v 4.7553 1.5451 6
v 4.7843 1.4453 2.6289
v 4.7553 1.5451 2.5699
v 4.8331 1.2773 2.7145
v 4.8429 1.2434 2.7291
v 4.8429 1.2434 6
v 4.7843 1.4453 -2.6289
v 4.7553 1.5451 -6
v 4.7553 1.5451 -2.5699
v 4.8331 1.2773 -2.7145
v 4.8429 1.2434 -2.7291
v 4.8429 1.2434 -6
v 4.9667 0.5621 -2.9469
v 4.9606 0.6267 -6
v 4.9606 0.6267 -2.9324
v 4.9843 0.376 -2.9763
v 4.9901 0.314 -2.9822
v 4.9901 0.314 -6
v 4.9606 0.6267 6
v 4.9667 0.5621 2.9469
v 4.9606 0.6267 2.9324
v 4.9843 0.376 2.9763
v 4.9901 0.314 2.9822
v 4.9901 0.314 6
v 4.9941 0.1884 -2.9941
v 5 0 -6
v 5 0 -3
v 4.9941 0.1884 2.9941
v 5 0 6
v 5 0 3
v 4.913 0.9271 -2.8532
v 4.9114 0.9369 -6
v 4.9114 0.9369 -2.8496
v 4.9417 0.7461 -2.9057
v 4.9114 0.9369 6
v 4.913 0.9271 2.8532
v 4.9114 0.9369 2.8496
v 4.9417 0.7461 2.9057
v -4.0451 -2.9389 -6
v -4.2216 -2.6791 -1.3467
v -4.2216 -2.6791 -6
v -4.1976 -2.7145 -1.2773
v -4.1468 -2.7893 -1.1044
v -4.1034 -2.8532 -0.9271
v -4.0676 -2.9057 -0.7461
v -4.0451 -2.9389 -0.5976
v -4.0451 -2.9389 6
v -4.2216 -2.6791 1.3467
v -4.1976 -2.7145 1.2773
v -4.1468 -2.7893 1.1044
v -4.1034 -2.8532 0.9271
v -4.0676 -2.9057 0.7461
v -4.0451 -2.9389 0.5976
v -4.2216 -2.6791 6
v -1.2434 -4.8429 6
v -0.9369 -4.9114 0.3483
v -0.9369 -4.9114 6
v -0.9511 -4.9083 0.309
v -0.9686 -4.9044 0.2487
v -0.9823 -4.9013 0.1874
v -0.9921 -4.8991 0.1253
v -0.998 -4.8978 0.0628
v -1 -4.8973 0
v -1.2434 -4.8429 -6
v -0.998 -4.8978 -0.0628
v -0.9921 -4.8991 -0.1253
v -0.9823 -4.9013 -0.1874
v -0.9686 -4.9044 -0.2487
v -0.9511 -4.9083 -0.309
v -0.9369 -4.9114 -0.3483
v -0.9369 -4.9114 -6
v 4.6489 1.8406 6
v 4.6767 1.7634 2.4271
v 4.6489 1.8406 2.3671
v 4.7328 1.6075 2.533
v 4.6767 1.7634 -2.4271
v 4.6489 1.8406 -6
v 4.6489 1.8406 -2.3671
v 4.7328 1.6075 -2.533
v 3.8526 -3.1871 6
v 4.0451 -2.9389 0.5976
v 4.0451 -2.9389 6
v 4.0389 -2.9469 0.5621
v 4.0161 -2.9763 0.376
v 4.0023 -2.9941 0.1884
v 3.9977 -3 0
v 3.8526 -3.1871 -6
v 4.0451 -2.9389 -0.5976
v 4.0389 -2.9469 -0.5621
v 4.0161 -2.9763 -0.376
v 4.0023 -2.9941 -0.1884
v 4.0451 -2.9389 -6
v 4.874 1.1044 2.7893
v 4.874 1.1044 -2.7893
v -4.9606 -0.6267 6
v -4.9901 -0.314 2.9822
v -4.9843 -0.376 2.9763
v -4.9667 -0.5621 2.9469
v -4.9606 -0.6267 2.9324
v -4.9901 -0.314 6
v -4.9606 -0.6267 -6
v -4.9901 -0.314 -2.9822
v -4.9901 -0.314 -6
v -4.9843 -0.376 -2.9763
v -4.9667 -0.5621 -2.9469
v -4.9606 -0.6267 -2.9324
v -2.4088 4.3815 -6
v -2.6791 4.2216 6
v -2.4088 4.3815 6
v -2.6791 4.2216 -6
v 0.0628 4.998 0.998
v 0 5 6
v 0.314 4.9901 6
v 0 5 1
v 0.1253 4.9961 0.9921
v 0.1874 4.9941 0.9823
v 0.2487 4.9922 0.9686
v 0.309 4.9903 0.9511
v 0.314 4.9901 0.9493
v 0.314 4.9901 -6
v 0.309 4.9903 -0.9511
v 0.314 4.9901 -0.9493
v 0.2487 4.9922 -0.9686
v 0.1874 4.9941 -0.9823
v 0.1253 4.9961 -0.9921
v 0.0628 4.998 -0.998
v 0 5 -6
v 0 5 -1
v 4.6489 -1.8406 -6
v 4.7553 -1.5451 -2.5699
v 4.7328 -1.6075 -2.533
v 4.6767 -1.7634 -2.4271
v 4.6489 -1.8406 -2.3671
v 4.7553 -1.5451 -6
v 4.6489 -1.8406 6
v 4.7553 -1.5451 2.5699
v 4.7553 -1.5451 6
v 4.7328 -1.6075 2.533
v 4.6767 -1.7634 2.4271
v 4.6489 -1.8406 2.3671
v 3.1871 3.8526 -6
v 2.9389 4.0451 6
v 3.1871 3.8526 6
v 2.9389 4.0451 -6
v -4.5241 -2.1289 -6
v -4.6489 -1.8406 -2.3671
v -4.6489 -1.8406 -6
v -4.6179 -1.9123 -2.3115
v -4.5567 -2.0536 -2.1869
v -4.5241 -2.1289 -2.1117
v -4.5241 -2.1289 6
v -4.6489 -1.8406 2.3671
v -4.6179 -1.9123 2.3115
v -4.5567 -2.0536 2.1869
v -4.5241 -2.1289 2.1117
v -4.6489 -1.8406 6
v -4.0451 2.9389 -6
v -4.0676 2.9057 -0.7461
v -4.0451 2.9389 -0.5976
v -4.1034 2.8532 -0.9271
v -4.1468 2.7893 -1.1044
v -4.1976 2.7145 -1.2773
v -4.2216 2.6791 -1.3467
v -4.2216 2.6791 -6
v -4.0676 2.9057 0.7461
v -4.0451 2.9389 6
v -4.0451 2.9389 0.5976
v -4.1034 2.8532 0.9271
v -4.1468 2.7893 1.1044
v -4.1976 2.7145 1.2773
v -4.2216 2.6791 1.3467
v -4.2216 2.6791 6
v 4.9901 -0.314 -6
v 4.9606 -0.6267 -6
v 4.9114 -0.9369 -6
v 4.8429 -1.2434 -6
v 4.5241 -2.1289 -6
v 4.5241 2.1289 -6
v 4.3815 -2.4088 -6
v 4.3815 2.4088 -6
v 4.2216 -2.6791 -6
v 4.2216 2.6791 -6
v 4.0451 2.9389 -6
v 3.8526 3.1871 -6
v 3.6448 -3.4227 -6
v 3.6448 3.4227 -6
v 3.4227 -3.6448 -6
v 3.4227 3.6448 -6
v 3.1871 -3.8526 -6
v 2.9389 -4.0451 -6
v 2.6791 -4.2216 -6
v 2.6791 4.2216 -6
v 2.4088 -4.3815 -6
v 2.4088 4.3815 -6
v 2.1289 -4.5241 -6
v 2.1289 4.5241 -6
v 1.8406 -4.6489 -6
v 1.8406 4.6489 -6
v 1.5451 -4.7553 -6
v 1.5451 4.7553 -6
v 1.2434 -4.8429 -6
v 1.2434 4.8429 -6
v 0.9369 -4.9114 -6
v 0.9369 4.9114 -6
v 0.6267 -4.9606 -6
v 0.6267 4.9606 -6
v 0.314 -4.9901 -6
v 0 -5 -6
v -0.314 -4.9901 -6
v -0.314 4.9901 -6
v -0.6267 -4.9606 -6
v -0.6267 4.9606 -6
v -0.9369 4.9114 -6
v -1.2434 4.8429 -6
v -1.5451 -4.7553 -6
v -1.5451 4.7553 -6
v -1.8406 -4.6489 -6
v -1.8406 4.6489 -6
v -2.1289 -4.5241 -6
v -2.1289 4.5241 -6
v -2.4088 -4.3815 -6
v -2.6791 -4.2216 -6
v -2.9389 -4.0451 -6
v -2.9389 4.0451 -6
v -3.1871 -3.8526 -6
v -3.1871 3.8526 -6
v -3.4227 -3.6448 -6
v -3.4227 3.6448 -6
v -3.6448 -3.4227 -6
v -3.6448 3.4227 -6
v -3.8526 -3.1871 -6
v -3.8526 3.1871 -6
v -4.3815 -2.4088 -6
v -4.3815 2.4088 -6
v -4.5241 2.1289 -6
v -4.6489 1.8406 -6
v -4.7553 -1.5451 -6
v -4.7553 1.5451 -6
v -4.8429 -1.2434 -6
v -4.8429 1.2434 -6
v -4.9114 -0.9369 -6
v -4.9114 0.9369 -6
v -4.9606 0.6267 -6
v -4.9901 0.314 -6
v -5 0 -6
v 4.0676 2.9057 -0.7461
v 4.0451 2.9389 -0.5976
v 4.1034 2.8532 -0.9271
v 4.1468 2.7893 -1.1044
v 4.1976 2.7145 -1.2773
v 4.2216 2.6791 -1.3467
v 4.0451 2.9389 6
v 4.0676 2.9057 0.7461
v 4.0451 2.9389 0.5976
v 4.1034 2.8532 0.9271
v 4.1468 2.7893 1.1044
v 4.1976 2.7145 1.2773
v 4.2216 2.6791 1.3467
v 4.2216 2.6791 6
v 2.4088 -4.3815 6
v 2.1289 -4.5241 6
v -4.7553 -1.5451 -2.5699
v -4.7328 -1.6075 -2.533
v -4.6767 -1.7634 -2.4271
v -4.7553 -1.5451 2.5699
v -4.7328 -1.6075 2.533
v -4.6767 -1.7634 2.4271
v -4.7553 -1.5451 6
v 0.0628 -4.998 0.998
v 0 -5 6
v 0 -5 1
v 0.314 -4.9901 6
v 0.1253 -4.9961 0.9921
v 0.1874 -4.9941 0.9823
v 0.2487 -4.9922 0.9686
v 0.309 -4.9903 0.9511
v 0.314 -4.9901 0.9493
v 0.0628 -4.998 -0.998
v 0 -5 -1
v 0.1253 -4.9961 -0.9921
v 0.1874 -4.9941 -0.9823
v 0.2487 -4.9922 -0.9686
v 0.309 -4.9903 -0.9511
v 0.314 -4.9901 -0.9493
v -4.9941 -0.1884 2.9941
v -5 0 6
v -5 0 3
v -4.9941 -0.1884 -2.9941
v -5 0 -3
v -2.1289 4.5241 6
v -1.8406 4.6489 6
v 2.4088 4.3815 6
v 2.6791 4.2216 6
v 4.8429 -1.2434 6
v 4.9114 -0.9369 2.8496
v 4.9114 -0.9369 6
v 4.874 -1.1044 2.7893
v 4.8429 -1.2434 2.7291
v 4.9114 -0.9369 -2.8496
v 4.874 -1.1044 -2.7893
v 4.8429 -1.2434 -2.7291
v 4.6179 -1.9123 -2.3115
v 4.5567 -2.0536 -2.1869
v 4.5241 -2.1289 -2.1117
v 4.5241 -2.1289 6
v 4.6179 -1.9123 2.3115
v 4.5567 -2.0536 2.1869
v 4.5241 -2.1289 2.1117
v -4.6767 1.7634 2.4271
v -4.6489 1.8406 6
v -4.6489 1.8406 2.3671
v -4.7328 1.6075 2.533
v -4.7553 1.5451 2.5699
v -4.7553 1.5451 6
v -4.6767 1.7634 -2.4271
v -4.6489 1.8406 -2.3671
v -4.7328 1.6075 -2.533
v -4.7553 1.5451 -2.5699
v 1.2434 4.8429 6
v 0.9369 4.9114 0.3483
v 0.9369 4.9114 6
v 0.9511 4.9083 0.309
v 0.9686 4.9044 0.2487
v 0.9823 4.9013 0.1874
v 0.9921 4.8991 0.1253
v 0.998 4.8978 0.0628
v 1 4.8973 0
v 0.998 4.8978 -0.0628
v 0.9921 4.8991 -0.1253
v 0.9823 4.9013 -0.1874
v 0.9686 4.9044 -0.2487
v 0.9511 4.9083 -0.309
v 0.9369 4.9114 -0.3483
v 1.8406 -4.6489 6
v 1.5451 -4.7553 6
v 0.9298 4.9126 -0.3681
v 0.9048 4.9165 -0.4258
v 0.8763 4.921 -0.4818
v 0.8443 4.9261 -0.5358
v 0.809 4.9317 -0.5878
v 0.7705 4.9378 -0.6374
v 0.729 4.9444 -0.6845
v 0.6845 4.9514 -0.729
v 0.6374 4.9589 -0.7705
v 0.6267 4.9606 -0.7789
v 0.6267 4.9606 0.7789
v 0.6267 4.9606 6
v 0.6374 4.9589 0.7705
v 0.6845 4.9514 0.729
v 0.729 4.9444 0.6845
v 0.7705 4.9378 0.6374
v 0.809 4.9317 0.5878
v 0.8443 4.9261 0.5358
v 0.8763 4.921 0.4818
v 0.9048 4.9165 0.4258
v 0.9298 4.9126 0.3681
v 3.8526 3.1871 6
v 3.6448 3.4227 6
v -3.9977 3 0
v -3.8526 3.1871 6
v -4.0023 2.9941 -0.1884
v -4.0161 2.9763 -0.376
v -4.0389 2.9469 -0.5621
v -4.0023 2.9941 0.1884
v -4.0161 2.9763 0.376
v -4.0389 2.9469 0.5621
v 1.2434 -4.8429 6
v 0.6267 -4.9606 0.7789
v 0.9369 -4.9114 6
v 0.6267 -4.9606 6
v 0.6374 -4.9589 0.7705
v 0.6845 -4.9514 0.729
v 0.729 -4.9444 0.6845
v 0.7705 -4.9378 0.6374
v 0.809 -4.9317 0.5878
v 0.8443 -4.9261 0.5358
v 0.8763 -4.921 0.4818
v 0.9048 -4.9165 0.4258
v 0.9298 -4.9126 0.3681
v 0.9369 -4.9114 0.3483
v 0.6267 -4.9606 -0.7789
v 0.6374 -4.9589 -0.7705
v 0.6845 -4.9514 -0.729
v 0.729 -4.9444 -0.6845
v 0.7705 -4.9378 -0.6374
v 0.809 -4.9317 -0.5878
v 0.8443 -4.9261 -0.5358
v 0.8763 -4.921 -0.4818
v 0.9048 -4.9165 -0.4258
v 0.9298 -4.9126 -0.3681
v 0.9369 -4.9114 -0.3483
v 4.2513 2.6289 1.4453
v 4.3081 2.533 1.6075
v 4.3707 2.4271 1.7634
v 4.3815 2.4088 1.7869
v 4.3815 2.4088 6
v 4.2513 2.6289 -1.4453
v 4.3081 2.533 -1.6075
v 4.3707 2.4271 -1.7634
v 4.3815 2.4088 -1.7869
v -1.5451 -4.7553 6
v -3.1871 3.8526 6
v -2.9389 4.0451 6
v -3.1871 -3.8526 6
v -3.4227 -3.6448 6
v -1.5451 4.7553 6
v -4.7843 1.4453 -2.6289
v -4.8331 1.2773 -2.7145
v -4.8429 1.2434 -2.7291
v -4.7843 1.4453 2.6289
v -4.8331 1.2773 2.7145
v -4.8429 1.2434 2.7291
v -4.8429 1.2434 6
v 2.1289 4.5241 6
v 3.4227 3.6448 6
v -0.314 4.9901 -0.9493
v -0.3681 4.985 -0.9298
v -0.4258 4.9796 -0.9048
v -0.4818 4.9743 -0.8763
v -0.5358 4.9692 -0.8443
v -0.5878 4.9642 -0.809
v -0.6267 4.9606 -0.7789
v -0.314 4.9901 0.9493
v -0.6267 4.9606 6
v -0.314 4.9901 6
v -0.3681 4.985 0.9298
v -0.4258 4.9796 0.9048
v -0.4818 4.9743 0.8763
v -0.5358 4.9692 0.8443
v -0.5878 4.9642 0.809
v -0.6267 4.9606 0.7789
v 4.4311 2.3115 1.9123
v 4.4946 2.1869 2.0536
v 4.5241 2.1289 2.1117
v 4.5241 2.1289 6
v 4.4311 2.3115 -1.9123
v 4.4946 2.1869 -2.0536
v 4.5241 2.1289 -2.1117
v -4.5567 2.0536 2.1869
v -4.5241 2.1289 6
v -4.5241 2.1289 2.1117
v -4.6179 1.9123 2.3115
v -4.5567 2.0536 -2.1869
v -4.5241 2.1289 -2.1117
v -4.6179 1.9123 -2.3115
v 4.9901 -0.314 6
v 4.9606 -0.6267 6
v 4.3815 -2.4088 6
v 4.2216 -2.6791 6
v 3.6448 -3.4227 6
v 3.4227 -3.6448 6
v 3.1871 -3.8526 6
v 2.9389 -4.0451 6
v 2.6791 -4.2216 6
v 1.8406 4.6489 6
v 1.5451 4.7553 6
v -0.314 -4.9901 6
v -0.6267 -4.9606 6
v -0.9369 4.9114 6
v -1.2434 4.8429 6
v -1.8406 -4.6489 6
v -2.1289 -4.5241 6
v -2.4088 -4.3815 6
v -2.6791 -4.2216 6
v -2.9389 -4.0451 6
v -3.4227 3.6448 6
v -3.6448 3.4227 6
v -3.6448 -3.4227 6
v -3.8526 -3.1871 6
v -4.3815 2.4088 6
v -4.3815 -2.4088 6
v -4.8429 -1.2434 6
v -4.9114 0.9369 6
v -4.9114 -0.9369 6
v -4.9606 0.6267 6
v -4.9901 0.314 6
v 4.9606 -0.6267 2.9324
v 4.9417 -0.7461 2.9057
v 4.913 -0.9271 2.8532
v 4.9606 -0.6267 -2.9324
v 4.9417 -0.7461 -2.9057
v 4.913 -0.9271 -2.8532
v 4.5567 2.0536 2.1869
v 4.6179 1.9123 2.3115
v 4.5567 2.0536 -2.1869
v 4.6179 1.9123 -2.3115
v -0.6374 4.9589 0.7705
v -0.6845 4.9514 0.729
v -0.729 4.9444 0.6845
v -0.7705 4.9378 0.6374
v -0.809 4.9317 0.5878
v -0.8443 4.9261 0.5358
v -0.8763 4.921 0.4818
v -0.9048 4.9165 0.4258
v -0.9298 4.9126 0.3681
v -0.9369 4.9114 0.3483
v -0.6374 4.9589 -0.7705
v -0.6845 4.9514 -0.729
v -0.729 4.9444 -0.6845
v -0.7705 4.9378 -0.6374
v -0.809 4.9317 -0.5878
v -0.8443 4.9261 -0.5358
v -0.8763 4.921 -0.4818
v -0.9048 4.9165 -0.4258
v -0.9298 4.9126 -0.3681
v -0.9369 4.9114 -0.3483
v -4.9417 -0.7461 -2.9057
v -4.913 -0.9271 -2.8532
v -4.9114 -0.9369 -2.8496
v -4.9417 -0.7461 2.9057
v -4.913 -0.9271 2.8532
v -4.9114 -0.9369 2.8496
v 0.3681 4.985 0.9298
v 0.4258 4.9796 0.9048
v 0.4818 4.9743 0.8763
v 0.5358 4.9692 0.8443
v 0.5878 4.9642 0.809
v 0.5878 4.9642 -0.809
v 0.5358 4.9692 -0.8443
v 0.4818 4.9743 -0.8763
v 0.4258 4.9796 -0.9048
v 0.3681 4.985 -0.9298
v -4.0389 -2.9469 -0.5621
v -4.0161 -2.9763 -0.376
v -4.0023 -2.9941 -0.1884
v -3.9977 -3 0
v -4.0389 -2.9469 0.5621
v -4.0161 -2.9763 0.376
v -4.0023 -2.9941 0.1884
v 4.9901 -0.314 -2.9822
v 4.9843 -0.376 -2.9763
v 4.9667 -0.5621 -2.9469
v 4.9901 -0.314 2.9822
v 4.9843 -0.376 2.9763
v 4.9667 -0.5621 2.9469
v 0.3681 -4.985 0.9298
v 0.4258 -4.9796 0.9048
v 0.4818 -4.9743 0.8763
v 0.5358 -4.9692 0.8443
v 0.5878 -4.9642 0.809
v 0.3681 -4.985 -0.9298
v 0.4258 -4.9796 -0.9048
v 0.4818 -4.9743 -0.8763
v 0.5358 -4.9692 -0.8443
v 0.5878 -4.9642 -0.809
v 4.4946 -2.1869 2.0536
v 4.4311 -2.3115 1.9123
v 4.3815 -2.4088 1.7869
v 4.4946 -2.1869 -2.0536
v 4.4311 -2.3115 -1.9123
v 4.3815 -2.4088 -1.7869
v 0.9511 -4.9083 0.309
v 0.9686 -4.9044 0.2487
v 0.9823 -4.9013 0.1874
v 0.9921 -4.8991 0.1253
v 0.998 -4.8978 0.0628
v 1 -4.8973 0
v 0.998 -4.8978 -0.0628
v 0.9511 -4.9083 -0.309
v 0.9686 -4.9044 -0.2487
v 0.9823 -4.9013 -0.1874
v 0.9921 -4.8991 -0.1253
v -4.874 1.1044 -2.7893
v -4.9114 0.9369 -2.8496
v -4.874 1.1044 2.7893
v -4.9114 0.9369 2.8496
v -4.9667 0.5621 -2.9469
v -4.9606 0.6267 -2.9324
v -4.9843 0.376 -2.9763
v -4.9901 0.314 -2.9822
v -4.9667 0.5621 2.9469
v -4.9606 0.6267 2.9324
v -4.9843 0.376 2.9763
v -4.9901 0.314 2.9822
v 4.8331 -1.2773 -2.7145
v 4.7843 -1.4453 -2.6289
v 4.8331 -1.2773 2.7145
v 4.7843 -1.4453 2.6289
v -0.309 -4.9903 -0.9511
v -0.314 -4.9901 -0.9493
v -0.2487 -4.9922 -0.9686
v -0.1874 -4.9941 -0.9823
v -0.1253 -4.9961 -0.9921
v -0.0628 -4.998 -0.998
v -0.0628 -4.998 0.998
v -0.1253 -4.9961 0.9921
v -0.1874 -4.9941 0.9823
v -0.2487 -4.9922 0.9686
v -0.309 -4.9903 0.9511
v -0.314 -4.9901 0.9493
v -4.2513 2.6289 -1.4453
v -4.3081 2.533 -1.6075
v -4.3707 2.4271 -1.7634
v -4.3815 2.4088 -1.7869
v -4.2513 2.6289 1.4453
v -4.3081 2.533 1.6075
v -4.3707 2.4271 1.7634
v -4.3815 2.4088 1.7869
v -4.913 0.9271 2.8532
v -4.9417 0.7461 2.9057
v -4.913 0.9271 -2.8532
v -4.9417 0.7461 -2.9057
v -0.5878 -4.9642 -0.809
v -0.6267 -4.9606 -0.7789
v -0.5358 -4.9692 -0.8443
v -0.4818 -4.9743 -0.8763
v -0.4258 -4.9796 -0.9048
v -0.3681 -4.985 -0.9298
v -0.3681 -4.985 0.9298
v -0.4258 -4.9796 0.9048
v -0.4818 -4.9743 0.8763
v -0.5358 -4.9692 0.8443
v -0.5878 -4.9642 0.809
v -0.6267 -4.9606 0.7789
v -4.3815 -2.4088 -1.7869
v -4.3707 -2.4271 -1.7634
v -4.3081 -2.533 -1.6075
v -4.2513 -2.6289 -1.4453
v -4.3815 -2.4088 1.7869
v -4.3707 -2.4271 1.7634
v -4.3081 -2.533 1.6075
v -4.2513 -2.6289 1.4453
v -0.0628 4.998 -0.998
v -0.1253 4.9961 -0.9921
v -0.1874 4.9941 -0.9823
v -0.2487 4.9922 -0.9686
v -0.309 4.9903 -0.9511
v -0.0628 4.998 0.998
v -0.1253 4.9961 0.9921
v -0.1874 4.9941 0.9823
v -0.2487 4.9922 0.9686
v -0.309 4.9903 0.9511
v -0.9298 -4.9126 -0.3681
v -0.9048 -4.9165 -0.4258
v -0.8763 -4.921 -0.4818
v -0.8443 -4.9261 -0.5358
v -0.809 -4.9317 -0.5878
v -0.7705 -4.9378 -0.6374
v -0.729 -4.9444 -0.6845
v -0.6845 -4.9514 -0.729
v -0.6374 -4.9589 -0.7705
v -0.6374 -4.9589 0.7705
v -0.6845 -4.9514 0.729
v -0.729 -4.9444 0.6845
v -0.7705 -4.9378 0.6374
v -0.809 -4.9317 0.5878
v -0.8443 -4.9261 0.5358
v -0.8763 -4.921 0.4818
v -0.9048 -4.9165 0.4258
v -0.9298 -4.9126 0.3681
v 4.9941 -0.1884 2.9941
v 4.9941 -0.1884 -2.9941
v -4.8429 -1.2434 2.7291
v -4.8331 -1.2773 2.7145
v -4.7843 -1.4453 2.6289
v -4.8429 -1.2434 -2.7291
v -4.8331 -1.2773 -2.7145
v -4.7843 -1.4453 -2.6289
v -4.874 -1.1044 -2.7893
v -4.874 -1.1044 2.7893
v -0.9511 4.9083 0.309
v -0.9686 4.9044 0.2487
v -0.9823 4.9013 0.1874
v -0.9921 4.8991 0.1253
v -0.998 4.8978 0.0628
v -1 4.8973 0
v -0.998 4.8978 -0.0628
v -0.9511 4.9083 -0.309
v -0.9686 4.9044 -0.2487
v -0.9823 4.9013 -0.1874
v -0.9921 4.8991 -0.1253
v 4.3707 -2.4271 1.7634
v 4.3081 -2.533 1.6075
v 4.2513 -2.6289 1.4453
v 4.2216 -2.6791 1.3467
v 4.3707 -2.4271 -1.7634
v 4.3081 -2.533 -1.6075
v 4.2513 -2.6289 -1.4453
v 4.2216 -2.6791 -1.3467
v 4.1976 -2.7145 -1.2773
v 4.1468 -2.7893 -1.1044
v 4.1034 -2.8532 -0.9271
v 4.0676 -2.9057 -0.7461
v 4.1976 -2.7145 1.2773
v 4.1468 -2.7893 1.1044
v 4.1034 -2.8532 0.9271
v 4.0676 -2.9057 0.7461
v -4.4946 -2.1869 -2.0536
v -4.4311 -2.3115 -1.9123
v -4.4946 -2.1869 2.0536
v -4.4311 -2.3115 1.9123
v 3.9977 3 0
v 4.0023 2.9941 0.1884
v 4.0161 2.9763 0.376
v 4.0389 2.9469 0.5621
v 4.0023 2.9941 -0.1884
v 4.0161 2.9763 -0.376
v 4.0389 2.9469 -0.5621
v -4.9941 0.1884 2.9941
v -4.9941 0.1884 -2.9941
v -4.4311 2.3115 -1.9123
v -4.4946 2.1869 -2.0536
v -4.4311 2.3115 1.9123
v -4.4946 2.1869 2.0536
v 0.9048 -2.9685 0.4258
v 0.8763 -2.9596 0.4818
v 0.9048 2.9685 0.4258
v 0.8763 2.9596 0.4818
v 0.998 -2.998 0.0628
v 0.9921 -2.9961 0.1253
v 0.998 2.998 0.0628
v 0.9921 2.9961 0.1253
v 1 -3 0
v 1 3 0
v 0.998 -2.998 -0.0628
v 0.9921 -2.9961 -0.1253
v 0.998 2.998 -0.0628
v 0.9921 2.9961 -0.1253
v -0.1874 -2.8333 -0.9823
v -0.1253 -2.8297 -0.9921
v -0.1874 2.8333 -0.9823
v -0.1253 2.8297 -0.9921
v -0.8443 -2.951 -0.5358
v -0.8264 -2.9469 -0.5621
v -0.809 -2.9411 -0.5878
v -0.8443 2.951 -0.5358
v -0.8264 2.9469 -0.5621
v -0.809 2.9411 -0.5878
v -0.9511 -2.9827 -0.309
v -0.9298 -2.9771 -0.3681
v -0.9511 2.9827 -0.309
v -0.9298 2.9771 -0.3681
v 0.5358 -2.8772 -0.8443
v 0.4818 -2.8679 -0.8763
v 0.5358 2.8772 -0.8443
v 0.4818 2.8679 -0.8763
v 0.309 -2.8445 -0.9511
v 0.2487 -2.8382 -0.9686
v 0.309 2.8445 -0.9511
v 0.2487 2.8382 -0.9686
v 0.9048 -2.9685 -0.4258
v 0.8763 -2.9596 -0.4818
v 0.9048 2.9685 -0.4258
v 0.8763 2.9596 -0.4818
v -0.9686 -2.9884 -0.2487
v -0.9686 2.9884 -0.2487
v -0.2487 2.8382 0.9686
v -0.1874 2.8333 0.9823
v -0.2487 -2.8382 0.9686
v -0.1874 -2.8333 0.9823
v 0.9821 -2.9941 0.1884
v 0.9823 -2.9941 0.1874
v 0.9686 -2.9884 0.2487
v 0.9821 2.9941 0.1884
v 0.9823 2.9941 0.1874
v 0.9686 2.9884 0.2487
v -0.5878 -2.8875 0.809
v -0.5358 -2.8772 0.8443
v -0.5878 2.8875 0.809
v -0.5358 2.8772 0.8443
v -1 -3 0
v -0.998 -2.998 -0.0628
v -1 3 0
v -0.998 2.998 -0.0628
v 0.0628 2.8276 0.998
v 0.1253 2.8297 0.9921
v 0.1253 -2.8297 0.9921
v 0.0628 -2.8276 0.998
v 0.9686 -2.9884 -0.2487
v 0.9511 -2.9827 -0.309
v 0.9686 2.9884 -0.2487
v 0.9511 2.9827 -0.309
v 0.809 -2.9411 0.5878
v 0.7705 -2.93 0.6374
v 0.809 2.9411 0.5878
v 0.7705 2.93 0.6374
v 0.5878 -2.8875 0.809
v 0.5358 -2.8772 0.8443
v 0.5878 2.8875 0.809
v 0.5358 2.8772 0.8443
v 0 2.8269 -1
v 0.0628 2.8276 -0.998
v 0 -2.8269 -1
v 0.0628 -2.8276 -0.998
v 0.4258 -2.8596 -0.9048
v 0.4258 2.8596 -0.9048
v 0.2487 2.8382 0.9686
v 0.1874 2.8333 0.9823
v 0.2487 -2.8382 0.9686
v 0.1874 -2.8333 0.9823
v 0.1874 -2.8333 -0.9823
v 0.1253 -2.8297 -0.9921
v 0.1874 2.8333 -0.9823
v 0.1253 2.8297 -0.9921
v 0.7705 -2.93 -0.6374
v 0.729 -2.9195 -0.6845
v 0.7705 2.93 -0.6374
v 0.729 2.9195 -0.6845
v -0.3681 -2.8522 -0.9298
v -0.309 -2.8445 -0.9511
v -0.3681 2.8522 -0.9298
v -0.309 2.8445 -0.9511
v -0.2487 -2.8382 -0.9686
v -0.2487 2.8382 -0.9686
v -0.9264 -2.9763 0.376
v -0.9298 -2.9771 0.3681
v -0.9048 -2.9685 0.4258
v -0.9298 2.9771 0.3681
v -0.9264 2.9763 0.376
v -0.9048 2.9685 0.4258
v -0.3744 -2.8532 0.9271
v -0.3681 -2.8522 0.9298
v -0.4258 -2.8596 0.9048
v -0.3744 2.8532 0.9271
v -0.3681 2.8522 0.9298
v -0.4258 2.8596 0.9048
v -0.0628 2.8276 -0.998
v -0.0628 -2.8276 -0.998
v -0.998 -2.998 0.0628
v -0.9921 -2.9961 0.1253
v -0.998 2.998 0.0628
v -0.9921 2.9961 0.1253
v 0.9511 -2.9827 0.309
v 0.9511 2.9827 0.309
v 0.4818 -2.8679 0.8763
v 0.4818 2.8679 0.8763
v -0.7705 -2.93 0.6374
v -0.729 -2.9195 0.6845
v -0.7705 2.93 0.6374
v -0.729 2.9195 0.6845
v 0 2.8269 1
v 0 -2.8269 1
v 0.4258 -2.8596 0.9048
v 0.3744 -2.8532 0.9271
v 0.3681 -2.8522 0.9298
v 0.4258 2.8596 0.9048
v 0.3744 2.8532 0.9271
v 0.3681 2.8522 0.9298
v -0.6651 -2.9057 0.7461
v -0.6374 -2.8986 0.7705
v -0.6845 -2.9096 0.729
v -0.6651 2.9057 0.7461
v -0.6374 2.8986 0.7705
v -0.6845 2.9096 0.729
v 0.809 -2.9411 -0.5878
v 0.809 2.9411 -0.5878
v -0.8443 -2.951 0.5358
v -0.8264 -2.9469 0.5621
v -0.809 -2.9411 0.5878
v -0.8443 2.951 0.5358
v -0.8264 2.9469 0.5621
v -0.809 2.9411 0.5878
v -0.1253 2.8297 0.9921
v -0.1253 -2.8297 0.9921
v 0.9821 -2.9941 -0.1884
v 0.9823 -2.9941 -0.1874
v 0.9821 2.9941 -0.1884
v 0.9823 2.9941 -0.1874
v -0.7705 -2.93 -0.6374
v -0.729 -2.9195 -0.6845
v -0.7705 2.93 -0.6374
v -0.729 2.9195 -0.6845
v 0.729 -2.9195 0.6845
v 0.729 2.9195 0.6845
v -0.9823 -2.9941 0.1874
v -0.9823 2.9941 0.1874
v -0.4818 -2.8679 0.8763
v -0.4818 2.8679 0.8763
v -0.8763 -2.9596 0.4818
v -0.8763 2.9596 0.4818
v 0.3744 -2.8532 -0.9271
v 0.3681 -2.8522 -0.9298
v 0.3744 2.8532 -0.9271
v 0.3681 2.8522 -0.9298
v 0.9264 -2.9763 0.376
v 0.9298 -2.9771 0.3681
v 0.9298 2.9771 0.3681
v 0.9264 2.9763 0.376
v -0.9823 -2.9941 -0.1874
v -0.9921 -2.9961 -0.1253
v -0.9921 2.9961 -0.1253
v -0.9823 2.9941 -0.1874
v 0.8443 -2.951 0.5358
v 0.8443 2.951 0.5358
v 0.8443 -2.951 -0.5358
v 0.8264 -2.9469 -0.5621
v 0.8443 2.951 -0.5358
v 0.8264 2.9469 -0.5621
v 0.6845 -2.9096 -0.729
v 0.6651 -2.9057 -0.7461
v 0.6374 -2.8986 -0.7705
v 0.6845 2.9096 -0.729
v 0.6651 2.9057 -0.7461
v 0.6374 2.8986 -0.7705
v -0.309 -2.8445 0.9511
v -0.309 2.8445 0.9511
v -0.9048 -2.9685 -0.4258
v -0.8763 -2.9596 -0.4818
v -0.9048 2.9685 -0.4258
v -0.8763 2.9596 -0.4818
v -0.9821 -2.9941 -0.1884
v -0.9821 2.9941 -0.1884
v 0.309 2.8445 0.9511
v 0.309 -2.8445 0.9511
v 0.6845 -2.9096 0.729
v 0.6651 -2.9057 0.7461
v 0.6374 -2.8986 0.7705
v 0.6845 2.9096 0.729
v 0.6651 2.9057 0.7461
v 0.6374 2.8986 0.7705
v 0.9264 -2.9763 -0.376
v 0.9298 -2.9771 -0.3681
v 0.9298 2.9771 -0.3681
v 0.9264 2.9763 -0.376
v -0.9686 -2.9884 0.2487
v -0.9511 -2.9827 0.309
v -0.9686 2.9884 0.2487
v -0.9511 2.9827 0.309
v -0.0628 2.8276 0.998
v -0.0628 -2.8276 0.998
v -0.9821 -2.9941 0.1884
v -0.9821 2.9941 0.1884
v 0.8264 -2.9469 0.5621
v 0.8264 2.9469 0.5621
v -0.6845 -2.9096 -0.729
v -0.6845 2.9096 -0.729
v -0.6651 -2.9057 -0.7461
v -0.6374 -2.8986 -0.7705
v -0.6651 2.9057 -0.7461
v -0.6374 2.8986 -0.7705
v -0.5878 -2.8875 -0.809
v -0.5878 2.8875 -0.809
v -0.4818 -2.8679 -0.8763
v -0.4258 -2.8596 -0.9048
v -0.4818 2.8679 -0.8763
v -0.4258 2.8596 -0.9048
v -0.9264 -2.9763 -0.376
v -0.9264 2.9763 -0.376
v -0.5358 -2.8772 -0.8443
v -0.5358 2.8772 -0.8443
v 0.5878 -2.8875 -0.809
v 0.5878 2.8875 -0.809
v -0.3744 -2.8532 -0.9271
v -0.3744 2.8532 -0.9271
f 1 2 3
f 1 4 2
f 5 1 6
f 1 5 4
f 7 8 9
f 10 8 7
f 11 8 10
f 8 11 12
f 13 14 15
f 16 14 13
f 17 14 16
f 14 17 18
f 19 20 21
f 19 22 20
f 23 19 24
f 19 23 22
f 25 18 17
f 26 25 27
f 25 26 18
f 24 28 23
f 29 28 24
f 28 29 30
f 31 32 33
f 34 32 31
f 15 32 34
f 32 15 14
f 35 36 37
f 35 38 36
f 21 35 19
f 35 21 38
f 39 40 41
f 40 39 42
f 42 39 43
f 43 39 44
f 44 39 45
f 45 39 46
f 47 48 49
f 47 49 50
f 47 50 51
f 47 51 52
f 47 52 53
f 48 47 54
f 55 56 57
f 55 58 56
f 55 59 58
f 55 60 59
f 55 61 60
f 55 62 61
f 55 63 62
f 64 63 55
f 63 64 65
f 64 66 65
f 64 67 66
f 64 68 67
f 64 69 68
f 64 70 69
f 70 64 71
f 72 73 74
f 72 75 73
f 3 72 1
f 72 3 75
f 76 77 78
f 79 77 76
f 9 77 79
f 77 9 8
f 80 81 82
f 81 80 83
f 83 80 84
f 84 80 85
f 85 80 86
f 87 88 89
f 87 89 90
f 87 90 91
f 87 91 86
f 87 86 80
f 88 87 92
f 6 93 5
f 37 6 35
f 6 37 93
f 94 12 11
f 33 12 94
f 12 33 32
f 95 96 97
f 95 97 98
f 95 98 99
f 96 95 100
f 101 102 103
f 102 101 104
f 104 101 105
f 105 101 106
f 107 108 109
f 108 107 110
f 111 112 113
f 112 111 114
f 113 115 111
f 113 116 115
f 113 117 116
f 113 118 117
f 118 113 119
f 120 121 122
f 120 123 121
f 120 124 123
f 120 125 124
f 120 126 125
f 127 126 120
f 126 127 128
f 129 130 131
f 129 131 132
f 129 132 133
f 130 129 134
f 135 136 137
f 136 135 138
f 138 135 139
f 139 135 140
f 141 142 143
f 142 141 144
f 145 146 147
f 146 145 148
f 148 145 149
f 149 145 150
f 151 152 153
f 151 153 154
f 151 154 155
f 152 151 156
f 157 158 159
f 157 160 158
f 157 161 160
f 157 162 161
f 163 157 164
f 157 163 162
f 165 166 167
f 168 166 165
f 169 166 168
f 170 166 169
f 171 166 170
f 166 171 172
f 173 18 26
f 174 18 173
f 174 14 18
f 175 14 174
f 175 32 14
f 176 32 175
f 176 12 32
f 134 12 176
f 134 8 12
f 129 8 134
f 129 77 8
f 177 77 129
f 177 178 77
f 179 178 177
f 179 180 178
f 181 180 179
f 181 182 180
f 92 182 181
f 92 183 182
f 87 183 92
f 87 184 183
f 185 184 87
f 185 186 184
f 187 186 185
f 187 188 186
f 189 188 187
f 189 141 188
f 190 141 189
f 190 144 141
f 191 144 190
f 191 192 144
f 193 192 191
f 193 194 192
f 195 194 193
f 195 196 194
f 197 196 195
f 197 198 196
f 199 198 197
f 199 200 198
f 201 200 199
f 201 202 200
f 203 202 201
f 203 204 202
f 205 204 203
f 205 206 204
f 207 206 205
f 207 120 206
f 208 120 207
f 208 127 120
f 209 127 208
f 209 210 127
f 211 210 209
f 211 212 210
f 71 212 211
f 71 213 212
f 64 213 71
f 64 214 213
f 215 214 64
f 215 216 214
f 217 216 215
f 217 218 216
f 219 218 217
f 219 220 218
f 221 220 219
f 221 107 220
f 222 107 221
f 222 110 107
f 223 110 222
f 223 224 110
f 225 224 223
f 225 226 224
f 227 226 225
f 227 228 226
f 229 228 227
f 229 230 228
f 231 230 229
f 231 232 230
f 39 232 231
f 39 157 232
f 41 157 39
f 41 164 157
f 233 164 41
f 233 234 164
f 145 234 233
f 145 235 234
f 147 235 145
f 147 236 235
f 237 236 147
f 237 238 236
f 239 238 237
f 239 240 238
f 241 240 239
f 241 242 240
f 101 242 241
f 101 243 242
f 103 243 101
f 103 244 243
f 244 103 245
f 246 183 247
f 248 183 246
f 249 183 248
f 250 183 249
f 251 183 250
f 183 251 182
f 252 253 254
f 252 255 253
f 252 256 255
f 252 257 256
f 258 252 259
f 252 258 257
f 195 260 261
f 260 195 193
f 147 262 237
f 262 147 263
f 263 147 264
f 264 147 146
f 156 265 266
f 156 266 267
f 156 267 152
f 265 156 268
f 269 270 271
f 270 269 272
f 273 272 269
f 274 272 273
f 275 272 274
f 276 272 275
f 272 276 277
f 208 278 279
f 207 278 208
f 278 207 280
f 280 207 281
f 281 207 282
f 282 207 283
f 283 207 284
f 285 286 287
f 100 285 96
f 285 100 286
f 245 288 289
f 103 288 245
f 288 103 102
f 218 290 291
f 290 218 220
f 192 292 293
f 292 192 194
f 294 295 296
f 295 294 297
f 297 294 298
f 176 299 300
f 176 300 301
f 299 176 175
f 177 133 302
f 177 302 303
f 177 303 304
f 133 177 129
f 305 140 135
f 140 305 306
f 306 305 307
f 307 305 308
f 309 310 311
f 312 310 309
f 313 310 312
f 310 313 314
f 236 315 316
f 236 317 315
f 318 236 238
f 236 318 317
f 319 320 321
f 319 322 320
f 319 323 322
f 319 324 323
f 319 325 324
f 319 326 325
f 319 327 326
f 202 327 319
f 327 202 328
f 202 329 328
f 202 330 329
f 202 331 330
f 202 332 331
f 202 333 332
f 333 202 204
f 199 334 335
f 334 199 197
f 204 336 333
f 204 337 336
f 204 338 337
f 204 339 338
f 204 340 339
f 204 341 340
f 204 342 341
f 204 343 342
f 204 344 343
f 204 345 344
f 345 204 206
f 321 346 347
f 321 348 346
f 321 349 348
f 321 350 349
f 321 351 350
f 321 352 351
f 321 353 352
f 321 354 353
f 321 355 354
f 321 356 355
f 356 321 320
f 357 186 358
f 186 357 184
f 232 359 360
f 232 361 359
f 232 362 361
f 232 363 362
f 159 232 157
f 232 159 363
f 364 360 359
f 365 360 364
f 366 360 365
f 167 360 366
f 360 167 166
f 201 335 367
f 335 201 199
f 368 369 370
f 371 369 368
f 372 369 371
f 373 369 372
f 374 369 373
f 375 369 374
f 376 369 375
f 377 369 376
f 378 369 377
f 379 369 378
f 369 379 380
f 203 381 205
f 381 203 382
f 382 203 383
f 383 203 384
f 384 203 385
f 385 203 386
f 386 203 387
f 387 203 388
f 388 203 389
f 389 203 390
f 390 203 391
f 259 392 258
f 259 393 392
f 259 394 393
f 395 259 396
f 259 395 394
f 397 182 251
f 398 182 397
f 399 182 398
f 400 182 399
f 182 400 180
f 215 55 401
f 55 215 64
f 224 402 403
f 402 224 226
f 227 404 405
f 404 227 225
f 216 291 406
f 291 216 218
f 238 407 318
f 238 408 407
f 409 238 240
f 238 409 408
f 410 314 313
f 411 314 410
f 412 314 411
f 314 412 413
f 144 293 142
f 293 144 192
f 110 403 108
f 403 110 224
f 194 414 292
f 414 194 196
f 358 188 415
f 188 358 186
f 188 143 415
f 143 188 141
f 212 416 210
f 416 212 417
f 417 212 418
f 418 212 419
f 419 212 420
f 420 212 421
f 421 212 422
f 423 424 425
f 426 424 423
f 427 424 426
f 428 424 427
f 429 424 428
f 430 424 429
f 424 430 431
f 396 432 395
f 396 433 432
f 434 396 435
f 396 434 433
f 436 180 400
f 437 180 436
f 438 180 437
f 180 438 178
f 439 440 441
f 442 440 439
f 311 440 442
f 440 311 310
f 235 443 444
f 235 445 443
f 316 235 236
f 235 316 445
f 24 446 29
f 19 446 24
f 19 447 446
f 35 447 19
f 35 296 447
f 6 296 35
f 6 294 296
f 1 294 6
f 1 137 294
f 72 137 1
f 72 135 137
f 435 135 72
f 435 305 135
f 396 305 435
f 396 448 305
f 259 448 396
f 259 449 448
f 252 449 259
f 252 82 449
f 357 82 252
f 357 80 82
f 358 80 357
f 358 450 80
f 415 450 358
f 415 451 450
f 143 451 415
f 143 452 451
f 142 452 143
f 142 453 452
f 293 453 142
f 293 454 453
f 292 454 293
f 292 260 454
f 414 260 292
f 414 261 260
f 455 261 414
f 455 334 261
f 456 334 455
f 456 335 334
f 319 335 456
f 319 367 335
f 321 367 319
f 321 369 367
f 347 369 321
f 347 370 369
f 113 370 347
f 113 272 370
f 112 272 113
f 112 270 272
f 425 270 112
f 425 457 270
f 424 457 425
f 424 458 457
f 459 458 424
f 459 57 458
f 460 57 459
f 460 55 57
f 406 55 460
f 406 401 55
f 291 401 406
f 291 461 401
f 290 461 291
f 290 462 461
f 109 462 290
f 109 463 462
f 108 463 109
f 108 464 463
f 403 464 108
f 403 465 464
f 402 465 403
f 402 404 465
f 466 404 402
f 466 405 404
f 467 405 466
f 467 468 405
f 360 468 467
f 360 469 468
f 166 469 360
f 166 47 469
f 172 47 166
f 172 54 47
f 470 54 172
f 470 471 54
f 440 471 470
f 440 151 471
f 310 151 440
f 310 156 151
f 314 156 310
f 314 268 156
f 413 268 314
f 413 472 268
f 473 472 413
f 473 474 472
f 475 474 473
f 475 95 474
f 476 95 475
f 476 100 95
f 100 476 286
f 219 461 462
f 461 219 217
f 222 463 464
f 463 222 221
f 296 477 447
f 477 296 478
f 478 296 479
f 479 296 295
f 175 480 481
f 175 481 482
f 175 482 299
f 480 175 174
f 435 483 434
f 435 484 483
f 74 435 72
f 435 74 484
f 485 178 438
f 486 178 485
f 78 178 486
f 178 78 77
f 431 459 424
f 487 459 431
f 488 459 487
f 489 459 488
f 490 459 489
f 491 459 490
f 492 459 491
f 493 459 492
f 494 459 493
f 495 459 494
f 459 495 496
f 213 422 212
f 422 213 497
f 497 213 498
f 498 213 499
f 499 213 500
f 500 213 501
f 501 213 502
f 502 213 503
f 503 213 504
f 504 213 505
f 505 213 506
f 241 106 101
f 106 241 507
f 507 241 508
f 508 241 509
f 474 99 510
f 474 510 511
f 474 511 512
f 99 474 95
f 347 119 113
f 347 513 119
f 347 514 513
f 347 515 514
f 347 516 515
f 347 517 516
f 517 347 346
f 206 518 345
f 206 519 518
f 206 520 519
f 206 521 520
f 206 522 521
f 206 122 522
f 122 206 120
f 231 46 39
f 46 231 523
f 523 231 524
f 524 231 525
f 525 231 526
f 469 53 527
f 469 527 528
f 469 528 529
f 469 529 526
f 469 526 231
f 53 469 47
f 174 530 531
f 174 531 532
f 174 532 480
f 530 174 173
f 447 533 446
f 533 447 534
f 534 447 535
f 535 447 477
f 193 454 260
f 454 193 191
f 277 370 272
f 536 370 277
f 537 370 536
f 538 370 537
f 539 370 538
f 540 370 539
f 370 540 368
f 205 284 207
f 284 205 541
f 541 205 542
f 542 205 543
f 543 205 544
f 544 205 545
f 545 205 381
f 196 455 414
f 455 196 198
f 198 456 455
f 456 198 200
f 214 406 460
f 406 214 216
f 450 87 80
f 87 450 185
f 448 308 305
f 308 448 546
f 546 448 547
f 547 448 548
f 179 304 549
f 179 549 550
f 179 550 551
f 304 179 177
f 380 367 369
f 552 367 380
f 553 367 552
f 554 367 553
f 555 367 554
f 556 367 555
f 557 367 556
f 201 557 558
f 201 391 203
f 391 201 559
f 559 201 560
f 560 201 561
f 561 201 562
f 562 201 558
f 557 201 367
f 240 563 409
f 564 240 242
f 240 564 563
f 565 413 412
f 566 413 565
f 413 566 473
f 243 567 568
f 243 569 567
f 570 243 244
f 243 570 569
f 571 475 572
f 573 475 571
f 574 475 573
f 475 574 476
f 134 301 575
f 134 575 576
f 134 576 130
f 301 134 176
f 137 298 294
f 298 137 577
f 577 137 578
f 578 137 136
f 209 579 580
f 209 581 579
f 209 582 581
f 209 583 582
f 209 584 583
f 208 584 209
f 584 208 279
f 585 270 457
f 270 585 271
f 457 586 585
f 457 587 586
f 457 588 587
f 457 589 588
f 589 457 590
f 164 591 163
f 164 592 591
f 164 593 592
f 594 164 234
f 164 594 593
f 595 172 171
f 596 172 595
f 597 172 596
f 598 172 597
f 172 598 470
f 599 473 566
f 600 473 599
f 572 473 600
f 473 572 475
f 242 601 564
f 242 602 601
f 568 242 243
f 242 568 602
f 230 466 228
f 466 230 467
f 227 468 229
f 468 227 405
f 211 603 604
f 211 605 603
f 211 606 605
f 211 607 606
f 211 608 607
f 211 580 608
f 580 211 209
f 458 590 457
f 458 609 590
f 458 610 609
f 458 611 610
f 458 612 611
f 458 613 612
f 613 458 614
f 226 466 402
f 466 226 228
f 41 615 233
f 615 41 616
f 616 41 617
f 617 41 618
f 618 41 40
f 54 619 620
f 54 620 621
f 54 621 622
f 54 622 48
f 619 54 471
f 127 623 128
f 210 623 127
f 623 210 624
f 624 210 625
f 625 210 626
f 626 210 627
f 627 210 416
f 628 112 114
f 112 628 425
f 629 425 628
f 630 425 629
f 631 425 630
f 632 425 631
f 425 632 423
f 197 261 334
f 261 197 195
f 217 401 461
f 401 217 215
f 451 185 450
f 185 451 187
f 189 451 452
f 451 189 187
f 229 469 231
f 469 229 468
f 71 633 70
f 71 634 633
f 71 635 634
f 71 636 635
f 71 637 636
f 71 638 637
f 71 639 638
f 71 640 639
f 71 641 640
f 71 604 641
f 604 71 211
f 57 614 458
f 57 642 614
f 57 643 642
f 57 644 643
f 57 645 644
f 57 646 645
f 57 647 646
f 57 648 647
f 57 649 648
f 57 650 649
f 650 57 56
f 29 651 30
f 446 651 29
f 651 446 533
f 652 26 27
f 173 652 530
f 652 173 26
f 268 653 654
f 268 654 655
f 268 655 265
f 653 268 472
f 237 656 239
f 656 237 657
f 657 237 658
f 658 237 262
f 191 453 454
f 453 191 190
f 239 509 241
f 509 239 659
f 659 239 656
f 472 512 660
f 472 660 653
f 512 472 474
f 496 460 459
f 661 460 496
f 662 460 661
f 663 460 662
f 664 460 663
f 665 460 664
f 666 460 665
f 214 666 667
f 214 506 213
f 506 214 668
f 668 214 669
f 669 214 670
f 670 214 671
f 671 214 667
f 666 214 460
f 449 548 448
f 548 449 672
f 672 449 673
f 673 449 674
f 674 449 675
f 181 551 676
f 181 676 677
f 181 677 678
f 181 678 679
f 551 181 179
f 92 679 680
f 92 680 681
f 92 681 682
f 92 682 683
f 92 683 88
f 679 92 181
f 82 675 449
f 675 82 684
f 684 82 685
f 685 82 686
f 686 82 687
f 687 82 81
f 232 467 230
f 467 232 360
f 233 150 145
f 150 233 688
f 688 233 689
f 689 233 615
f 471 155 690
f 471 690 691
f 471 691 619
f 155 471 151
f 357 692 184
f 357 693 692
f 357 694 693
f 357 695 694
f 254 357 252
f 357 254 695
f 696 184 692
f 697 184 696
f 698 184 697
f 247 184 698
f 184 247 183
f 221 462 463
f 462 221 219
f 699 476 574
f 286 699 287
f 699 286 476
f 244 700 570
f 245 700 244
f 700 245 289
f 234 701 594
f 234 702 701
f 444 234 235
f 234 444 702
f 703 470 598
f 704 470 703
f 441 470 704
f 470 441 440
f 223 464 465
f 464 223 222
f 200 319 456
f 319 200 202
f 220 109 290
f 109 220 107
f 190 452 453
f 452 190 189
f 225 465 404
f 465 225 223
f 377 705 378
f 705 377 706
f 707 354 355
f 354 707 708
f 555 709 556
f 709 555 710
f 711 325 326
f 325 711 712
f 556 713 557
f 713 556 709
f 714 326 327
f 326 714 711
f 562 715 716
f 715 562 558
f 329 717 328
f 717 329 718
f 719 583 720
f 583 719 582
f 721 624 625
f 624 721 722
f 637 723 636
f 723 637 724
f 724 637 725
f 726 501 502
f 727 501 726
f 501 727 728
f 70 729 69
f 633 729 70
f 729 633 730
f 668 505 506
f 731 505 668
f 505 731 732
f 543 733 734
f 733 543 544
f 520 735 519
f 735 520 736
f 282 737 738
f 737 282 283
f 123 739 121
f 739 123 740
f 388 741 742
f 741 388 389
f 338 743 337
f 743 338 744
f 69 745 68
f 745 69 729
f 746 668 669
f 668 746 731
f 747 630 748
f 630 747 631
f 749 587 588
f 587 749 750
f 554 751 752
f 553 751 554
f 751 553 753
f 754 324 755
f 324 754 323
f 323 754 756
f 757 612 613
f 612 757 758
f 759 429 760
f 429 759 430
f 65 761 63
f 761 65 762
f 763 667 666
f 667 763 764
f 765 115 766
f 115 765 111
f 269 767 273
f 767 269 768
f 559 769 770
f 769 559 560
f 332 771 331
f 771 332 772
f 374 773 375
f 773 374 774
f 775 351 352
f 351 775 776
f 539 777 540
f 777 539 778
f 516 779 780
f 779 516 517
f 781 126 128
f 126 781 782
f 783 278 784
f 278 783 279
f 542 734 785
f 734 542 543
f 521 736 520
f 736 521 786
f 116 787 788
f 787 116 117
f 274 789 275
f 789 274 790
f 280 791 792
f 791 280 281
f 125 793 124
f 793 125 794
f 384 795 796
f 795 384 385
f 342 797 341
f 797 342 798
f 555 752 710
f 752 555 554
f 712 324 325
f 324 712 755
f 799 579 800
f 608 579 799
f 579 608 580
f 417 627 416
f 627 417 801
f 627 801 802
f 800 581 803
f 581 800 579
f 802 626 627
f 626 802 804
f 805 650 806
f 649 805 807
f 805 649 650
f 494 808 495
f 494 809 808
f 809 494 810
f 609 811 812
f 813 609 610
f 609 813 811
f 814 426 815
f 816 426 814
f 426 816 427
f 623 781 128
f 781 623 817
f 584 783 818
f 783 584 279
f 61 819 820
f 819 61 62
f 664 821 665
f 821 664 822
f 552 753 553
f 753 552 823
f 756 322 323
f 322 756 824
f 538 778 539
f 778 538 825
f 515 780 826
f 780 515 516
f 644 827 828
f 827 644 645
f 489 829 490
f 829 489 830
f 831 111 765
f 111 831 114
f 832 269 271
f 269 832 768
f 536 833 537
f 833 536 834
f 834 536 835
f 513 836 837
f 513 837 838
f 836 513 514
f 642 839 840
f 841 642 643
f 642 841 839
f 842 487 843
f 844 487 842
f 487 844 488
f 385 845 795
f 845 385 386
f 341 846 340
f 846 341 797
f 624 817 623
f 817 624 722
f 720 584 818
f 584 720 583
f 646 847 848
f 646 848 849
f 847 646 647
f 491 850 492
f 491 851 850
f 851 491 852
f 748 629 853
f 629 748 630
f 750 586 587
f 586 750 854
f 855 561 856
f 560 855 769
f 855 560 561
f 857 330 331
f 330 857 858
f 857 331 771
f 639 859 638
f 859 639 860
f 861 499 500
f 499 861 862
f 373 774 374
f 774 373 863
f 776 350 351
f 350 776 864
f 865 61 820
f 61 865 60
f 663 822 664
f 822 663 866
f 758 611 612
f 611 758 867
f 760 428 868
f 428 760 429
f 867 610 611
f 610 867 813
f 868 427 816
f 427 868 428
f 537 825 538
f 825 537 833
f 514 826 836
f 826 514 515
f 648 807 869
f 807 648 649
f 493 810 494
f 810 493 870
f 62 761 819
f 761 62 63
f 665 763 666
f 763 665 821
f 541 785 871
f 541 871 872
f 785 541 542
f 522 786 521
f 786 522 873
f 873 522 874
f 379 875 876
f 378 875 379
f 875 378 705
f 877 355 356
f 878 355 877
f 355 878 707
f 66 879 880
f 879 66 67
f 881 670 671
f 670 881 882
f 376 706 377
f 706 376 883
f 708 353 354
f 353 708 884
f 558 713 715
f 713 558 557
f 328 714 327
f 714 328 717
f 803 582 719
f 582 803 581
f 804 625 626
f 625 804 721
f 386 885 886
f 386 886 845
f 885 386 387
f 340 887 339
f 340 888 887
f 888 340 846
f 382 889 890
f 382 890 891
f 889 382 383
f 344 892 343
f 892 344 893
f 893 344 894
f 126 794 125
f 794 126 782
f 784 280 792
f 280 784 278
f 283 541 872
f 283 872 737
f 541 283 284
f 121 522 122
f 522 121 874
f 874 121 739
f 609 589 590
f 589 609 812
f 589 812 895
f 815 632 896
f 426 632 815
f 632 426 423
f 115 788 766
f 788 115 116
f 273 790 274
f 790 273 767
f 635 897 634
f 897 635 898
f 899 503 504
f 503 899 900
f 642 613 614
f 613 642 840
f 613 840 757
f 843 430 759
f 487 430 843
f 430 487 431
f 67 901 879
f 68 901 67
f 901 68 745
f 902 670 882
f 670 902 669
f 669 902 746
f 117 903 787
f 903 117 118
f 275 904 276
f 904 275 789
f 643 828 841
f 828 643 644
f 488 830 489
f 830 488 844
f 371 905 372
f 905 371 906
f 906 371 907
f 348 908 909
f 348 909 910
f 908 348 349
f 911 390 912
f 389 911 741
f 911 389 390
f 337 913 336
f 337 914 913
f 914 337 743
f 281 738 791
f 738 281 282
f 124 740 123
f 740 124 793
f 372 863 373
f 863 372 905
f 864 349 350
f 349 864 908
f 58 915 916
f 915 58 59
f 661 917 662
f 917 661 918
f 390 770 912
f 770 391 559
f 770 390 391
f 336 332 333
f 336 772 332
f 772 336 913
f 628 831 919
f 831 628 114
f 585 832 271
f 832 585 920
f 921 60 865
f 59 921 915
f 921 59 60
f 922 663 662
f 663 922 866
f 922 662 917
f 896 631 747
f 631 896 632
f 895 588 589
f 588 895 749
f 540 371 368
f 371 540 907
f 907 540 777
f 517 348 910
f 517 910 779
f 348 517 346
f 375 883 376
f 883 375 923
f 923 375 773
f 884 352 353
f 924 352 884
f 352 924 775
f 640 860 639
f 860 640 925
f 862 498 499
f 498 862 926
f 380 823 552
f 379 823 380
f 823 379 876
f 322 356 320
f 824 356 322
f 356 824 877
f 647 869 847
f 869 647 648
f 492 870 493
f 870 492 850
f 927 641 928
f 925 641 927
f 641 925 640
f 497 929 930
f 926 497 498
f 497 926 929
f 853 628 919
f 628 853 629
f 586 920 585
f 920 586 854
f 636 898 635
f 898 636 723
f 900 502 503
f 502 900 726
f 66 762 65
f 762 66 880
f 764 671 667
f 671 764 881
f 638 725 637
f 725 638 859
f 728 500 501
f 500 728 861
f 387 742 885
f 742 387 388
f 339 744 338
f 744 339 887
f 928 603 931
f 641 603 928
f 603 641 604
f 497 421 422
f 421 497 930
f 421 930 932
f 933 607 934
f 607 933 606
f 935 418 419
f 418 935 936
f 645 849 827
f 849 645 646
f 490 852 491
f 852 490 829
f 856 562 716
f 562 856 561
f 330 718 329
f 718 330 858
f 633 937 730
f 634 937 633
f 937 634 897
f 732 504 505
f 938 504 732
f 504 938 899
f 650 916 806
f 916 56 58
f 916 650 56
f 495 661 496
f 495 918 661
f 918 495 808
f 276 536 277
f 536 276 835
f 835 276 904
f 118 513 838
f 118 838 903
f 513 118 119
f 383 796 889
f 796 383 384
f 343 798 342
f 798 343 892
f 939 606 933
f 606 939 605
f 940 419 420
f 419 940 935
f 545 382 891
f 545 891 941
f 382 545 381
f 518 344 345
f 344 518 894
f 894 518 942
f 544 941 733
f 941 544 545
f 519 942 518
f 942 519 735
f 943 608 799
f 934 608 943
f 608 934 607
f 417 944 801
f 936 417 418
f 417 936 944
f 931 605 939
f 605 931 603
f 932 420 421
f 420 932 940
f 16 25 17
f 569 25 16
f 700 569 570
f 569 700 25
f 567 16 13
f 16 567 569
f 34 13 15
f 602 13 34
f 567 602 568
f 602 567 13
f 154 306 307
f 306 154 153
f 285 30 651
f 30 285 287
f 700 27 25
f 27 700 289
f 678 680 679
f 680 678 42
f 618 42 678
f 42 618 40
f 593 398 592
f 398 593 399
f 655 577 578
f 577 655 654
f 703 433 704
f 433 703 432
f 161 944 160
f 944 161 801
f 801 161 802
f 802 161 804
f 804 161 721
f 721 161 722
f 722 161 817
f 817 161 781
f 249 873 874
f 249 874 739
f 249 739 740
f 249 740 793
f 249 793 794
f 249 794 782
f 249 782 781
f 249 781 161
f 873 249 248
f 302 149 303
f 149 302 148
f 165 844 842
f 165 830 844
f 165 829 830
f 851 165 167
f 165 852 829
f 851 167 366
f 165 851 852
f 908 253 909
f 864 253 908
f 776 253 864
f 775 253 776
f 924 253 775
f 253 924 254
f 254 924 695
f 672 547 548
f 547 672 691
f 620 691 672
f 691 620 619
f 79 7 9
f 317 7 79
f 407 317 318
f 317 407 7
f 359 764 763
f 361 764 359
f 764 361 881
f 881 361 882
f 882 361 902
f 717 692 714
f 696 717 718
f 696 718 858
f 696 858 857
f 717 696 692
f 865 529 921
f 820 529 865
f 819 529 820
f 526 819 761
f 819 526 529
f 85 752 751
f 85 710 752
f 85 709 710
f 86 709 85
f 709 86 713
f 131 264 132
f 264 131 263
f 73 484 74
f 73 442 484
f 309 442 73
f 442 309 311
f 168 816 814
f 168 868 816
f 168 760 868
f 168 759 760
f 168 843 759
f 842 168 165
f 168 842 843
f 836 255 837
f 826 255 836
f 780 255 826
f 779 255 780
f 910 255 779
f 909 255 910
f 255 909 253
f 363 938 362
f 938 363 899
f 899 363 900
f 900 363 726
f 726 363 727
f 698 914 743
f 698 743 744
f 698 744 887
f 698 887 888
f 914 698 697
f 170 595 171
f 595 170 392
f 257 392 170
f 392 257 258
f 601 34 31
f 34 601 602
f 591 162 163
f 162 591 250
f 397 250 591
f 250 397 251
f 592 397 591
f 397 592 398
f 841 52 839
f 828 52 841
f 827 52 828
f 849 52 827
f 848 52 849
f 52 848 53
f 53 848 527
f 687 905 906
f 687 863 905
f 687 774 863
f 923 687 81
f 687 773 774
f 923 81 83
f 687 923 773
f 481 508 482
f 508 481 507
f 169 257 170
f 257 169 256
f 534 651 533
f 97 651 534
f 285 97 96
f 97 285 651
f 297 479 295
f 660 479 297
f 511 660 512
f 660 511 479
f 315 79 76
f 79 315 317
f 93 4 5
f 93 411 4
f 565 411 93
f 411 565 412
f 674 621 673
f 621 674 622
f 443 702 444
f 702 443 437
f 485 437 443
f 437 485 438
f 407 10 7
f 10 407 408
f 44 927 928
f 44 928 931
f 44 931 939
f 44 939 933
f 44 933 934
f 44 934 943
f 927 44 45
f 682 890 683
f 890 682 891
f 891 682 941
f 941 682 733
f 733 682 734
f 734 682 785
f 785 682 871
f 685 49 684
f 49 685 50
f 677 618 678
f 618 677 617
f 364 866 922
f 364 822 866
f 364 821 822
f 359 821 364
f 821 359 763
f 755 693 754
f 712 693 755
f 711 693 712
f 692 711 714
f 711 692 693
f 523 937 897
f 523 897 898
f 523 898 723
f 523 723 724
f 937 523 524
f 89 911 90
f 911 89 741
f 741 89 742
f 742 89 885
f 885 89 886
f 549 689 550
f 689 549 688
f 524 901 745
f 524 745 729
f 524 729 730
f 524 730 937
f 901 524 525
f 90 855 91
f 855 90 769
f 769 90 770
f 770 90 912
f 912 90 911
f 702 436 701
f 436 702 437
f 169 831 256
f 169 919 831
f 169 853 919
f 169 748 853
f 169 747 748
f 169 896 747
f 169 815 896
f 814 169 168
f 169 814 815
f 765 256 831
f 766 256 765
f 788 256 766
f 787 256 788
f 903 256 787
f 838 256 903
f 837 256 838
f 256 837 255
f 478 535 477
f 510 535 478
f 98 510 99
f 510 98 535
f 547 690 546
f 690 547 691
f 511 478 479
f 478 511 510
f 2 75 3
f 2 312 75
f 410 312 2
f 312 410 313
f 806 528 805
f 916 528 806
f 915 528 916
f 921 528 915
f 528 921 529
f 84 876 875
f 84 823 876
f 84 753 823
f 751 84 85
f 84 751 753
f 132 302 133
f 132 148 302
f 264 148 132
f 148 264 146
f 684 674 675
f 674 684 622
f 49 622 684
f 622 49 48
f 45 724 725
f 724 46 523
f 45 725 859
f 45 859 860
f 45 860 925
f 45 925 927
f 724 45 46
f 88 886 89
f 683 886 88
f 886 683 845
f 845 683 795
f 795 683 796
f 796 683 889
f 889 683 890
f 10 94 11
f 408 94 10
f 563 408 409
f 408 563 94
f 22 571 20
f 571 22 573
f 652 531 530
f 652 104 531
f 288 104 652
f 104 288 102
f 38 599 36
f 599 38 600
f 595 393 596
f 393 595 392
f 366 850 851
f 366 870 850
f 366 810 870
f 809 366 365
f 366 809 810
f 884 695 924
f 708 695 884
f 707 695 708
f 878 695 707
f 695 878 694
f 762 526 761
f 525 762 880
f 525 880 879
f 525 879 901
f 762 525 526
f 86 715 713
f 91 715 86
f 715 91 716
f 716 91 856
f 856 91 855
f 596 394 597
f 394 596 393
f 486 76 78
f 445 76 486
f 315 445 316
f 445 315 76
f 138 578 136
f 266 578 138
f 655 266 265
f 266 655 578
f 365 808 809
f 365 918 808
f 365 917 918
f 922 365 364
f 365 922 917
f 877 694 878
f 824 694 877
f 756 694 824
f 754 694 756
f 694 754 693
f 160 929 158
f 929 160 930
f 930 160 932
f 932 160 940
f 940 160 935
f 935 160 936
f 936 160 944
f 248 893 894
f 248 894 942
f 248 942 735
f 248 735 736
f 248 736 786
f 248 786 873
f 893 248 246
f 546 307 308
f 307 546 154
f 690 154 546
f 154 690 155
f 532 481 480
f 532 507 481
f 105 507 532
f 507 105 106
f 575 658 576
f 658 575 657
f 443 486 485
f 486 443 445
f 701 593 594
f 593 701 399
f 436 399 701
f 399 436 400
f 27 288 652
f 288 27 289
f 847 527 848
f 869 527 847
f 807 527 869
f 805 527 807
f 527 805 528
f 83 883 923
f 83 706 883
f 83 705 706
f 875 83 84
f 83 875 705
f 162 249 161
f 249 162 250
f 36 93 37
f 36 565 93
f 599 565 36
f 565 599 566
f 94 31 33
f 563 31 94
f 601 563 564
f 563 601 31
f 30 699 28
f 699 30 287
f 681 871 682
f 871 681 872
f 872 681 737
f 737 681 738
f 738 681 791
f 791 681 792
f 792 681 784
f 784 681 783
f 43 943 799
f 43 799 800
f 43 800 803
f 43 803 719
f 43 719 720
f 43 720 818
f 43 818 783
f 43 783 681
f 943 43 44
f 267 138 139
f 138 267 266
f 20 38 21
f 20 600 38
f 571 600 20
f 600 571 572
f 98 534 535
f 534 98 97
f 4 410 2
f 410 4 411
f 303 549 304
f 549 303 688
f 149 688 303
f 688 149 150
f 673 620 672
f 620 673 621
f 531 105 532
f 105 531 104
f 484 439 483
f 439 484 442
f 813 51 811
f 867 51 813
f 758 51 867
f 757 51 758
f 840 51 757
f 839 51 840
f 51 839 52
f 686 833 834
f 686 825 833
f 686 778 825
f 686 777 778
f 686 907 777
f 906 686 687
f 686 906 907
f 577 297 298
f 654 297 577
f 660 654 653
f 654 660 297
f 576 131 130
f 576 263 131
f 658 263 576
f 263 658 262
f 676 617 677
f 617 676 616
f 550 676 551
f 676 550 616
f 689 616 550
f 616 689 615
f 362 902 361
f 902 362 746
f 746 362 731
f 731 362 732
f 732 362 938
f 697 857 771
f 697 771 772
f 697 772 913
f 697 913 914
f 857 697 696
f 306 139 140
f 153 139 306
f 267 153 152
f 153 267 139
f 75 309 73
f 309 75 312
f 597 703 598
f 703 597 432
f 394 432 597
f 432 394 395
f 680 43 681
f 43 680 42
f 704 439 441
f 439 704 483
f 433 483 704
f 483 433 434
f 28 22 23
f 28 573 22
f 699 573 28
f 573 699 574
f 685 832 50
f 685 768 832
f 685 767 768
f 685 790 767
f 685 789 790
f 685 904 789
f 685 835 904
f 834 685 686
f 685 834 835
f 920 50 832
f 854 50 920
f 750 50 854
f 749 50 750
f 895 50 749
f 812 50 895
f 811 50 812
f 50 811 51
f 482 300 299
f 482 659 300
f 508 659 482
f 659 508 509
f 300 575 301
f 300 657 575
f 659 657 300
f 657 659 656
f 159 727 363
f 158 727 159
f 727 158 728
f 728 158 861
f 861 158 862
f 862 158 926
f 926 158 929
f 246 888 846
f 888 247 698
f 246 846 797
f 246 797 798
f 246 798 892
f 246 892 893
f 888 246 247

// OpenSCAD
// See http://en.wikibooks.org/wiki/OpenSCAD_User_Manual/The_OpenSCAD_Language#Modifier_Characters
// Use this subtree as usual in the rendering process but also draw it unmodified in transparent pink.
// Usage:
//   # { ... }


difference() {
	// start objects
	cylinder (h = 12, r=5, center = true, $fn=100);
        // first object that will subtracted
	#rotate ([90,0,0]) cylinder (h = 15, r=1, center = true, $fn=100);
        // second object that will be subtracted
	#rotate ([0,90,0]) cylinder (h = 15, r=3, center = true, $fn=100);
}
